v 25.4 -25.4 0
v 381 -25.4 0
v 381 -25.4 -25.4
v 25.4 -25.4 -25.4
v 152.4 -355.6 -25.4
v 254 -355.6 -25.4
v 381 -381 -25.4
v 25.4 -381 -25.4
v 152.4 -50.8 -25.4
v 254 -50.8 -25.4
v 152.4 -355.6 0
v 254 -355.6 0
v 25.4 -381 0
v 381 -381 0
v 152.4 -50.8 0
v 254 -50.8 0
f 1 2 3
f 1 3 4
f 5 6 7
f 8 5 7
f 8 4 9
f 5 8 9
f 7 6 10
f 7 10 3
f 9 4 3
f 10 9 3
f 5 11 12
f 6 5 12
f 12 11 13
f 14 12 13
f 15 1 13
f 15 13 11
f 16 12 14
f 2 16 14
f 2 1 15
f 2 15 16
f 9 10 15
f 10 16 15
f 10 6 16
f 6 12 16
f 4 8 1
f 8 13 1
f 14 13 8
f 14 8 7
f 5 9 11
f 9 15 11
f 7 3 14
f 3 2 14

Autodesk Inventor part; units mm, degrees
ref_plane "YZ Plane" through (0, 0, 0) normal (1, 0, 0) x (0, 1, 0)
ref_plane "XZ Plane" through (0, 0, 0) normal (0, 1, 0) x (-1, 0, 0)
ref_plane "XY Plane" through (0, 0, 0) normal (0, 0, 1) x (1, 0, 0)
sketch "Sketch1" plane through (0, 0, 0) normal (0, 0, 1) x (1, 0, 0)
  line L0 (0, 0) -> (812.8, 0) construction
  line L1 (812.8, 0) -> (812.8, -406.4) construction
  line L2 (812.8, -406.4) -> (0, -406.4) construction
  line L3 (0, -406.4) -> (0, 0) construction
  line L4 (0, 0) -> (406.4, 0)
  line L5 (406.4, 0) -> (406.4, -25.4)
  line L6 (406.4, -25.4) -> (0, -25.4)
  line L7 (0, -25.4) -> (0, 0)
  line L8 (406.4, -25.4) -> (381, -25.4)
  line L9 (381, -25.4) -> (381, -406.4)
  line L10 (381, -406.4) -> (406.4, -406.4)
  line L11 (406.4, -406.4) -> (406.4, -25.4)
  line L12 (381, -406.4) -> (0, -406.4)
  line L13 (0, -406.4) -> (0, -381)
  line L14 (0, -381) -> (381, -381)
  line L15 (381, -381) -> (381, -406.4)
  line L16 (0, -381) -> (25.4, -381)
  line L17 (25.4, -381) -> (25.4, -25.4)
  line L18 (25.4, -25.4) -> (0, -25.4)
  line L19 (0, -25.4) -> (0, -381)
  dimension "d1" = 812.8
  dimension "d5" = 406.4
  dimension "d6" = 25.4
  dimension "d7" = 25.4
  dimension "d8" = 381
  dimension "d9" = 381
  dimension "d10" = 25.4
  dimension "d11" = 25.4
extrude "Extrusion1" add sketch "Sketch1" against normal blind 25.4 contours L6 L9 L14 L17
sketch "Sketch3" plane through (0, 0, 0) normal (0, 0, 1) x (1, 0, 0)
  line L0 (-406.4, 0) -> (406.4, 0) construction
  line L1 (406.4, 0) -> (406.4, -406.4) construction
  line L2 (406.4, -406.4) -> (-406.4, -406.4) construction
  line L3 (-406.4, -406.4) -> (-406.4, 0) construction
  line L4 (406.4, 0) -> (406.4, -406.4)
  line L5 (381, -381) -> (25.4, -381) projected
  line L6 (203.2, -381) -> (203.2, -355.6)
  line L7 (203.2, -355.6) -> (254, -355.6)
  line L8 (254, -355.6) -> (254, -50.8)
  line L9 (254, -50.8) -> (152.4, -50.8)
  line L10 (152.4, -50.8) -> (152.4, -355.6)
  line L11 (152.4, -355.6) -> (203.2, -355.6)
  point P0 (0, 0)
  dimension "d36" = 812.8
  dimension "d45" = 25.4
  dimension "d46" = 50.8
  dimension "d47" = 304.8
  dimension "d48" = 101.6
extrude "Extrusion3" cut sketch "Sketch3" against normal blind 25.4
properties part number "JukeBox Top Panel SQ"
